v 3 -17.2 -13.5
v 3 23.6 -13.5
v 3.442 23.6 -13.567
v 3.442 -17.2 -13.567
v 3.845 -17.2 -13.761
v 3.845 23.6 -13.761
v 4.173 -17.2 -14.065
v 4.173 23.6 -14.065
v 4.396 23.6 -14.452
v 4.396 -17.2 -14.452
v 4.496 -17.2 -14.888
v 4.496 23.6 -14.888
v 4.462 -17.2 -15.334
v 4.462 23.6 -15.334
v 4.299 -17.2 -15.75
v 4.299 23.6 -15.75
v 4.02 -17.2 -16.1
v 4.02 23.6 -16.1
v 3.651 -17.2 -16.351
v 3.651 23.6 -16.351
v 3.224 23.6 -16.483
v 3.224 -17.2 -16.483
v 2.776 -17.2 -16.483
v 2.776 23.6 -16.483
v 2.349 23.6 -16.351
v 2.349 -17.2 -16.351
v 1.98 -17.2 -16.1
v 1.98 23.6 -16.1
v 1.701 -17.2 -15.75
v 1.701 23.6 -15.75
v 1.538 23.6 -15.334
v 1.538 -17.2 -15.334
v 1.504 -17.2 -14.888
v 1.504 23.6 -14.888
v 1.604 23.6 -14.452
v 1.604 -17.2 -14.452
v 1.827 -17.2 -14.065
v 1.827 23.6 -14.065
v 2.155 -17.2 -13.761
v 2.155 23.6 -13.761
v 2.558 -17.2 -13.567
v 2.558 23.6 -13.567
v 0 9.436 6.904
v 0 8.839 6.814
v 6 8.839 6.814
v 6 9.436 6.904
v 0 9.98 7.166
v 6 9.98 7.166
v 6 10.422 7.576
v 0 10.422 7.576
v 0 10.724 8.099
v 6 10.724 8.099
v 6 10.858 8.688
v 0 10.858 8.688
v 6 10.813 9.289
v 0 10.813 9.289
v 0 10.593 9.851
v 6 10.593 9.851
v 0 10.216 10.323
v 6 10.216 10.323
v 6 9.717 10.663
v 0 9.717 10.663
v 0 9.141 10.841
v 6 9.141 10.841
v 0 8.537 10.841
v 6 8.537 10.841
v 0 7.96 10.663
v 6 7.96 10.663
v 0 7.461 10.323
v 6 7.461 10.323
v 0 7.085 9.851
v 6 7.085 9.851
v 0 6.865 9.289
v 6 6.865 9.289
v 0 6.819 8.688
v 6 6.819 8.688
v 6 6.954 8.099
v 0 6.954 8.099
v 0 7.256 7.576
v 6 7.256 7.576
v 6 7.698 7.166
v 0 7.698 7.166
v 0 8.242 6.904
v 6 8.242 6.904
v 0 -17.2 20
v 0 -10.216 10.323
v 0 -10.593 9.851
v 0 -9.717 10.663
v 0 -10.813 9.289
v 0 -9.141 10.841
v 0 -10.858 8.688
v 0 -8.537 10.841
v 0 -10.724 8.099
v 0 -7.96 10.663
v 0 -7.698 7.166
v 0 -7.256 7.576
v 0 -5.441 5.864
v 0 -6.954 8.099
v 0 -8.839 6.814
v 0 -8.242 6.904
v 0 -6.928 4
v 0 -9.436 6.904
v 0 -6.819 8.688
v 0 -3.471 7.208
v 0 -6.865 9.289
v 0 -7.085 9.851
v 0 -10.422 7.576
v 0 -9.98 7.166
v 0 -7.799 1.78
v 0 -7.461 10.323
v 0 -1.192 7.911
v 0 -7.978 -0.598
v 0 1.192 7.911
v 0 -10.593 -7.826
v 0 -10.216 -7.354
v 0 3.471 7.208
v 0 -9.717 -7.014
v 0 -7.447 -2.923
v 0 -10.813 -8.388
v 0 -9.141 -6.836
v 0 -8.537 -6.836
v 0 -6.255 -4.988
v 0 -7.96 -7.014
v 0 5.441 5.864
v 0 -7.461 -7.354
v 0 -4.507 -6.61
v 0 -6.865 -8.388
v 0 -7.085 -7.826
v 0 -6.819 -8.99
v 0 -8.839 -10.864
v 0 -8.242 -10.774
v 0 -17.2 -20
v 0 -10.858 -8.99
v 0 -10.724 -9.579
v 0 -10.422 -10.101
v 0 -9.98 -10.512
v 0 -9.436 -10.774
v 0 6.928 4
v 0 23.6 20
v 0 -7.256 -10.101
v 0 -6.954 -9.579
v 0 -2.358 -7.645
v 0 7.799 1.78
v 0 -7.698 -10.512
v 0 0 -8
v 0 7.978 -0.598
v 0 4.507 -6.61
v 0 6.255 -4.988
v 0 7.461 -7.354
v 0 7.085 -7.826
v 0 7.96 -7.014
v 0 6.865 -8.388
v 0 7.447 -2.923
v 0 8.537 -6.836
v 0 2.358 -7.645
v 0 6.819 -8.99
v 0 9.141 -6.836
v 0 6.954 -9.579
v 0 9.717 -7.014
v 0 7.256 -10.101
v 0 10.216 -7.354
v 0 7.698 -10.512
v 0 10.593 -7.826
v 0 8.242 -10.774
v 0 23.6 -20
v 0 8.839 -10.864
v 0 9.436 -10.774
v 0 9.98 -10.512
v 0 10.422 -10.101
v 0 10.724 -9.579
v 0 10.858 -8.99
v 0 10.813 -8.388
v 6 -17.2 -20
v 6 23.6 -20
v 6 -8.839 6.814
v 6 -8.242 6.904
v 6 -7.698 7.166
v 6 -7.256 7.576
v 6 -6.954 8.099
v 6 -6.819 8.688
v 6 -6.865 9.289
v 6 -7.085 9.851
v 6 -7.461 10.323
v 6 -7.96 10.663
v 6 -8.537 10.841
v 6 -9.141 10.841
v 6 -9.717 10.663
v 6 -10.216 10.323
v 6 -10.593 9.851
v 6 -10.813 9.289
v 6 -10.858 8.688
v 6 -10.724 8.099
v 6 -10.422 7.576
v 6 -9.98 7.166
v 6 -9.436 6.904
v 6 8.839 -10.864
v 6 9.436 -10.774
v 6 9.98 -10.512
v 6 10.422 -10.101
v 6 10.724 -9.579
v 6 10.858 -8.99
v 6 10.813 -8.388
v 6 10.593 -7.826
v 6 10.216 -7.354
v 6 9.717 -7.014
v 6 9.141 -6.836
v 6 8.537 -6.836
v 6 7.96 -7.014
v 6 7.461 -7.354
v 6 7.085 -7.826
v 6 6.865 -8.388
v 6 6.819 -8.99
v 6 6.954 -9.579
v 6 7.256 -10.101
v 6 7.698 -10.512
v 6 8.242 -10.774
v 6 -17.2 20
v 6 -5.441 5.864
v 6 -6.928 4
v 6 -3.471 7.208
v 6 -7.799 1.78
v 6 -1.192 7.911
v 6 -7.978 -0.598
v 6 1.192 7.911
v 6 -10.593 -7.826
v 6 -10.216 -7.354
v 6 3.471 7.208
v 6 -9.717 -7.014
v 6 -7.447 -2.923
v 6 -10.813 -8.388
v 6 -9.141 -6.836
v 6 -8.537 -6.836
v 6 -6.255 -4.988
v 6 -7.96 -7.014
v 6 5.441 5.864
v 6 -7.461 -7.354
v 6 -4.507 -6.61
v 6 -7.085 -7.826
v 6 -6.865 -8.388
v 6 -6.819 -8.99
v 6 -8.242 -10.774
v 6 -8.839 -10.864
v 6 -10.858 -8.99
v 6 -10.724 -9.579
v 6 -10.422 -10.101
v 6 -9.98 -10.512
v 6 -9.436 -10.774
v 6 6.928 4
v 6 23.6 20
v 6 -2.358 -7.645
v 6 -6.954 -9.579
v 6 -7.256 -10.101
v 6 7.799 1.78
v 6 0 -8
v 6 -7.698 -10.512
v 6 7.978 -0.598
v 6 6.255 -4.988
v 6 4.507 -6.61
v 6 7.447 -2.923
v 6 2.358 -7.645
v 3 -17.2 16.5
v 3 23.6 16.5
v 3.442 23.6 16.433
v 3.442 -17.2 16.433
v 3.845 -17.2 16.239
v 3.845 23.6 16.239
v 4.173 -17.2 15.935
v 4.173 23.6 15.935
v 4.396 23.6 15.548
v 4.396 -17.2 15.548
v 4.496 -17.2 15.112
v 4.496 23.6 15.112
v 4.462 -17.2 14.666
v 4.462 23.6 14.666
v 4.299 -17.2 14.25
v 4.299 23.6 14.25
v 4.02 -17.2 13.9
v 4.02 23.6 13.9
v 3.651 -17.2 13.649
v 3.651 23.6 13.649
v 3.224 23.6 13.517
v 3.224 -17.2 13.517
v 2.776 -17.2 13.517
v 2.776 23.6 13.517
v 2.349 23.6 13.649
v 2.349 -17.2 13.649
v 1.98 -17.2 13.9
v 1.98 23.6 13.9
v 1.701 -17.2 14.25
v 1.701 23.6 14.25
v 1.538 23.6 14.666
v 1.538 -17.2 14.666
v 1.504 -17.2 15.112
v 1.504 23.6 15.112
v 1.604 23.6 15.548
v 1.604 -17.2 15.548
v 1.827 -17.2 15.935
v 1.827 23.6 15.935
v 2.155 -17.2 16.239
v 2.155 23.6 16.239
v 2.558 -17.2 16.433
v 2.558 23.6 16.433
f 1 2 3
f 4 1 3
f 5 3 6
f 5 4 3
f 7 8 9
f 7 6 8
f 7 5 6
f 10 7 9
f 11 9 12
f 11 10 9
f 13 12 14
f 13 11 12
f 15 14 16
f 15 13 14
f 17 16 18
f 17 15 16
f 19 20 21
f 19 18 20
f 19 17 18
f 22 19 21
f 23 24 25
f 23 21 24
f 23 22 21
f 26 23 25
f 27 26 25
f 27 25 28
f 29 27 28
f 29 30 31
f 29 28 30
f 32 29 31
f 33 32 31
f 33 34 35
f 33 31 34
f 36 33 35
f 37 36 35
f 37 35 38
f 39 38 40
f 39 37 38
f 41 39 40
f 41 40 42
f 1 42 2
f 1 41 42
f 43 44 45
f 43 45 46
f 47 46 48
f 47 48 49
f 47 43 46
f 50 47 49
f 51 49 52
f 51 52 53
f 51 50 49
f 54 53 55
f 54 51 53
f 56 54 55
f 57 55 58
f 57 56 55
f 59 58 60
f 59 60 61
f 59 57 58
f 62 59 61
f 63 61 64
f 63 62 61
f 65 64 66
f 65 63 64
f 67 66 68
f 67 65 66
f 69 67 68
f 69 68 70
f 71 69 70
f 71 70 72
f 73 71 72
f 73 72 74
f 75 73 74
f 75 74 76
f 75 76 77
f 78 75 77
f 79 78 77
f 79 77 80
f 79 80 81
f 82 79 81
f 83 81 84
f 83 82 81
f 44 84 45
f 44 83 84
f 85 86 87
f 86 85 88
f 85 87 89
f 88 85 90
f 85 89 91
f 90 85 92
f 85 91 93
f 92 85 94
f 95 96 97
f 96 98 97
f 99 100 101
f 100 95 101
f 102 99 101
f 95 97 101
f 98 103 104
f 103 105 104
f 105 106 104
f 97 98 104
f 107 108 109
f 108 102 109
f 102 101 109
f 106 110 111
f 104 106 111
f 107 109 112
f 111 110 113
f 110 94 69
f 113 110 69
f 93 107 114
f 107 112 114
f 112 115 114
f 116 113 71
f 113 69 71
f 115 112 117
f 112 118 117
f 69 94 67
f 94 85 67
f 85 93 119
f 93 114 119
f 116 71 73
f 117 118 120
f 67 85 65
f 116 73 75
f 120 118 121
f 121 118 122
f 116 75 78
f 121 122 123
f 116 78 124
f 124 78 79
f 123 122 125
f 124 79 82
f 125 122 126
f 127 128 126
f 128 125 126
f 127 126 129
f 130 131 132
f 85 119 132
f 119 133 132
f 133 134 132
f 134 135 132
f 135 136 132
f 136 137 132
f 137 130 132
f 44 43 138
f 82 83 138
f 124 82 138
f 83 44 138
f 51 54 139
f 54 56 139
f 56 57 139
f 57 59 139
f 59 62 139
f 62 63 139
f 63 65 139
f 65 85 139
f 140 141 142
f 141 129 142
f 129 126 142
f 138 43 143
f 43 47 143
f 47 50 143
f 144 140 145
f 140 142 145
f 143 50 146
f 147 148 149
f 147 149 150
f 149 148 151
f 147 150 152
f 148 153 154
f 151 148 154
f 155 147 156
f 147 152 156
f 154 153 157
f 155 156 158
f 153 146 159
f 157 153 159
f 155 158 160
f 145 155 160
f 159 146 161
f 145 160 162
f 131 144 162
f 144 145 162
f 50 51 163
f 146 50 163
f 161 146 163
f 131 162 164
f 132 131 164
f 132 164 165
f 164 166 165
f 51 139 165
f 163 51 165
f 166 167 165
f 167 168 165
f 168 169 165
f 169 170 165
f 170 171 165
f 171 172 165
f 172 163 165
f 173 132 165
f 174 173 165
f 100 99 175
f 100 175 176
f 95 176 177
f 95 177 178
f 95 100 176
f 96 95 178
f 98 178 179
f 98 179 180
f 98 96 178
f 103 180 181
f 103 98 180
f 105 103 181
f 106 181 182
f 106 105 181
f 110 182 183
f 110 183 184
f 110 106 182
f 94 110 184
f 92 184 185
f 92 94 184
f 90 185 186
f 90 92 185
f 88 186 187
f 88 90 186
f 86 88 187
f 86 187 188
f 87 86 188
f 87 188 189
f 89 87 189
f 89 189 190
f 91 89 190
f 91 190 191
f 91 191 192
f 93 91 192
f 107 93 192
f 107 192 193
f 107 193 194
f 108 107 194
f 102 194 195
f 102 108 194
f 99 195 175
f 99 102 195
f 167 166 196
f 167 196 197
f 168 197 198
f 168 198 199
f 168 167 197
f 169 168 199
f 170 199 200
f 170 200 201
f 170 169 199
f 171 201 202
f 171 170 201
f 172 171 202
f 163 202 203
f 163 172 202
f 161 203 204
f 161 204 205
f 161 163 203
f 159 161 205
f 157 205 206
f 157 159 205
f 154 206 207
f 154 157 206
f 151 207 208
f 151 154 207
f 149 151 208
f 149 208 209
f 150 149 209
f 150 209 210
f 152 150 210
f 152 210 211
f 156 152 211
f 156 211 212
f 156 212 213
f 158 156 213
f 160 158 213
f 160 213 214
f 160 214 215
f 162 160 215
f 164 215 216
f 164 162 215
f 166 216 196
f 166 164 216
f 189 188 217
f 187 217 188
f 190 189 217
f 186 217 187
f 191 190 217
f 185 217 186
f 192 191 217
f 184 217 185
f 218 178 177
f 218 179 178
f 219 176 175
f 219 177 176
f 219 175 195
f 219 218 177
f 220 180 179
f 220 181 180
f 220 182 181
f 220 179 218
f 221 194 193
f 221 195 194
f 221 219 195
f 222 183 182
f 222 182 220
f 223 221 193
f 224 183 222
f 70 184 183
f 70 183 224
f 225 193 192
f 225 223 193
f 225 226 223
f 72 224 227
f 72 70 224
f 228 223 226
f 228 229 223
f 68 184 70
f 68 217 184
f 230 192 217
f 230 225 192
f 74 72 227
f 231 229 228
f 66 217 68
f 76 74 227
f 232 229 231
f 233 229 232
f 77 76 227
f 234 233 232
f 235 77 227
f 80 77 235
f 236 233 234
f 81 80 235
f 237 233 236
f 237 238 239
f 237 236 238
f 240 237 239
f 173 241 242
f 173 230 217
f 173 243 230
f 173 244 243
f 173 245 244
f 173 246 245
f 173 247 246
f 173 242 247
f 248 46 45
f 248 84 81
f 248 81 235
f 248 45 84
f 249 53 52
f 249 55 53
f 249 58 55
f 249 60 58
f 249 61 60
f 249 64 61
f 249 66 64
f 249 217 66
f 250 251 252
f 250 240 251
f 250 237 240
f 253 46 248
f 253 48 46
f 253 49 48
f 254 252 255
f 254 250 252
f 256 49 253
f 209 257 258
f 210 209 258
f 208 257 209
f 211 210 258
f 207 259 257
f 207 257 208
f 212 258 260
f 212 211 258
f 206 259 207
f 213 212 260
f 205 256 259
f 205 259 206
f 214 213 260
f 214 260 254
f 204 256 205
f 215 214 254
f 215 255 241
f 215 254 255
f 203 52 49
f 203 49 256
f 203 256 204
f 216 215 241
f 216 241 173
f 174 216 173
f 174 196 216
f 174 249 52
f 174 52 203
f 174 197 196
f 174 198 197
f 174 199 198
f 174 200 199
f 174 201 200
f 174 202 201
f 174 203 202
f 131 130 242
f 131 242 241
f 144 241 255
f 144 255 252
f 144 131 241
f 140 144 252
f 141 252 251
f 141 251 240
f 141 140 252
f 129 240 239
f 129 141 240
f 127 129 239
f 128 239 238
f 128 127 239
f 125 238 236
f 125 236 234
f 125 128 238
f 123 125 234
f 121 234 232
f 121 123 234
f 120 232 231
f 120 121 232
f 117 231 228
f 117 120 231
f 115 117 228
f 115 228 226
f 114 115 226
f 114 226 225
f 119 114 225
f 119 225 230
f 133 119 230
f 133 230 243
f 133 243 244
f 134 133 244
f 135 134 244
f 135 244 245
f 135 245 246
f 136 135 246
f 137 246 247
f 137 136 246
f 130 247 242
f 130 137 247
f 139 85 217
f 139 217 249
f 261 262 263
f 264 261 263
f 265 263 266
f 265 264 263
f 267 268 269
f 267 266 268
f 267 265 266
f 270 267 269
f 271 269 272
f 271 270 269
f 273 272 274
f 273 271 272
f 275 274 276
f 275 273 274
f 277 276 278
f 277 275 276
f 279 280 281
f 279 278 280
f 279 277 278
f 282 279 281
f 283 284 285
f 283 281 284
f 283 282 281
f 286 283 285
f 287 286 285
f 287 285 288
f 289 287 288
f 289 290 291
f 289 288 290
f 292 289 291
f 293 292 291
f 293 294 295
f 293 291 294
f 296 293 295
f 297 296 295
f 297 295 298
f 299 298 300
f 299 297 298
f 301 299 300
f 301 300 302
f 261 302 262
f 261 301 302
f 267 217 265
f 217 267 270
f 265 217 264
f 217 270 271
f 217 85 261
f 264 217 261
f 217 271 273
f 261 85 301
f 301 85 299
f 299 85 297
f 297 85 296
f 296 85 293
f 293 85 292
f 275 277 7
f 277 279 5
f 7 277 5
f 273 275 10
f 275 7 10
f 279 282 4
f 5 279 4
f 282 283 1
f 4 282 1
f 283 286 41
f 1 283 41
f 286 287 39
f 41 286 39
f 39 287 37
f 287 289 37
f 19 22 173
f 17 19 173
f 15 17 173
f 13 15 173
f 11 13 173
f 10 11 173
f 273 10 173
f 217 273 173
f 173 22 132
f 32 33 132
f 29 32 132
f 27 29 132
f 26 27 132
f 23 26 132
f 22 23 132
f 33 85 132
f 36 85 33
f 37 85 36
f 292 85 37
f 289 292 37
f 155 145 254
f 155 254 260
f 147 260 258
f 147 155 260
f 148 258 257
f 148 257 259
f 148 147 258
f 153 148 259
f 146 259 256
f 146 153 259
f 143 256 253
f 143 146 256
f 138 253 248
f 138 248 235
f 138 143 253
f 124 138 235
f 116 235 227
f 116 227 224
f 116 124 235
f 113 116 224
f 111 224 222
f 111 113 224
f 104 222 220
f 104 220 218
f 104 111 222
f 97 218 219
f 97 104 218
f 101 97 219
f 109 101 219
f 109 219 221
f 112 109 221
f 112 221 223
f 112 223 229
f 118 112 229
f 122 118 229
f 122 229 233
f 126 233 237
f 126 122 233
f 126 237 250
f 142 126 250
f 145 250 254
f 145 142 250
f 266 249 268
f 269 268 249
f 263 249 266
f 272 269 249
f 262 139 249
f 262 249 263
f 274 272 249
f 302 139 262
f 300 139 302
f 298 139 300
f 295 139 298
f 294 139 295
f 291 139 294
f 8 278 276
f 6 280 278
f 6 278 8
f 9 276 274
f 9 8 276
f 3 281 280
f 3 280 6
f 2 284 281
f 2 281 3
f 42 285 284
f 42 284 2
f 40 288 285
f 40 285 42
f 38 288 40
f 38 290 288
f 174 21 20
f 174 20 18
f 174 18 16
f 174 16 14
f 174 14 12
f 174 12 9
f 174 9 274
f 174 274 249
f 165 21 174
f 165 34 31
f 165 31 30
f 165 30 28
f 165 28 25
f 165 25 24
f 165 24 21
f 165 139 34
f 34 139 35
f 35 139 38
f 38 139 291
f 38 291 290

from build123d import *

# Parameters (mm, degrees)
SKETCH_1_W               = 40
SKETCH_1_H               = 40.8
SKETCH_1_R               = 8
SKETCH_1_R_2             = 2.025
EXTRUDE_1_DEPTH          = 6
CUT_EXTRUDE_1_DEPTH      = 32.511267826
CUT_EXTRUDE_1_DEPTH_BACK = 32.511267826
SKETCH_2_R               = 1.5


with BuildPart() as part:
    # 草图1 → 凸台-拉伸1 (new body)
    with BuildSketch(Plane(origin=(0, 0, 0), x_dir=(0, 0, -1), z_dir=(1, 0, 0))):
        with Locations((0, 3.2)):
            Rectangle(SKETCH_1_W, SKETCH_1_H)
        Circle(SKETCH_1_R, mode=Mode.SUBTRACT)
        with Locations((-8.838834765, 8.838834765)):
            Circle(SKETCH_1_R_2, mode=Mode.SUBTRACT)
        with Locations((8.838834765, 8.838834765)):
            Circle(SKETCH_1_R_2, mode=Mode.SUBTRACT)
        with Locations((8.838834765, -8.838834765)):
            Circle(SKETCH_1_R_2, mode=Mode.SUBTRACT)
        with Locations((-8.838834765, -8.838834765)):
            Circle(SKETCH_1_R_2, mode=Mode.SUBTRACT)
    extrude(amount=EXTRUDE_1_DEPTH)

    # 草图2 → 切除-拉伸1 (cut, two sides: drawn at the far end of the back side and taken through both)
    with BuildSketch(Plane(origin=(0, 0, 0), x_dir=(1, 0, 0), z_dir=(0, 1, 0)).offset(-CUT_EXTRUDE_1_DEPTH_BACK)):
        with Locations(Location((3, 15, 0), (0, 0, 270))):
            Circle(SKETCH_2_R)
        with Locations(Location((3, -15, 0), (0, 0, 270))):
            Circle(SKETCH_2_R)
    extrude(amount=CUT_EXTRUDE_1_DEPTH + CUT_EXTRUDE_1_DEPTH_BACK, mode=Mode.SUBTRACT)


solid = part.part
